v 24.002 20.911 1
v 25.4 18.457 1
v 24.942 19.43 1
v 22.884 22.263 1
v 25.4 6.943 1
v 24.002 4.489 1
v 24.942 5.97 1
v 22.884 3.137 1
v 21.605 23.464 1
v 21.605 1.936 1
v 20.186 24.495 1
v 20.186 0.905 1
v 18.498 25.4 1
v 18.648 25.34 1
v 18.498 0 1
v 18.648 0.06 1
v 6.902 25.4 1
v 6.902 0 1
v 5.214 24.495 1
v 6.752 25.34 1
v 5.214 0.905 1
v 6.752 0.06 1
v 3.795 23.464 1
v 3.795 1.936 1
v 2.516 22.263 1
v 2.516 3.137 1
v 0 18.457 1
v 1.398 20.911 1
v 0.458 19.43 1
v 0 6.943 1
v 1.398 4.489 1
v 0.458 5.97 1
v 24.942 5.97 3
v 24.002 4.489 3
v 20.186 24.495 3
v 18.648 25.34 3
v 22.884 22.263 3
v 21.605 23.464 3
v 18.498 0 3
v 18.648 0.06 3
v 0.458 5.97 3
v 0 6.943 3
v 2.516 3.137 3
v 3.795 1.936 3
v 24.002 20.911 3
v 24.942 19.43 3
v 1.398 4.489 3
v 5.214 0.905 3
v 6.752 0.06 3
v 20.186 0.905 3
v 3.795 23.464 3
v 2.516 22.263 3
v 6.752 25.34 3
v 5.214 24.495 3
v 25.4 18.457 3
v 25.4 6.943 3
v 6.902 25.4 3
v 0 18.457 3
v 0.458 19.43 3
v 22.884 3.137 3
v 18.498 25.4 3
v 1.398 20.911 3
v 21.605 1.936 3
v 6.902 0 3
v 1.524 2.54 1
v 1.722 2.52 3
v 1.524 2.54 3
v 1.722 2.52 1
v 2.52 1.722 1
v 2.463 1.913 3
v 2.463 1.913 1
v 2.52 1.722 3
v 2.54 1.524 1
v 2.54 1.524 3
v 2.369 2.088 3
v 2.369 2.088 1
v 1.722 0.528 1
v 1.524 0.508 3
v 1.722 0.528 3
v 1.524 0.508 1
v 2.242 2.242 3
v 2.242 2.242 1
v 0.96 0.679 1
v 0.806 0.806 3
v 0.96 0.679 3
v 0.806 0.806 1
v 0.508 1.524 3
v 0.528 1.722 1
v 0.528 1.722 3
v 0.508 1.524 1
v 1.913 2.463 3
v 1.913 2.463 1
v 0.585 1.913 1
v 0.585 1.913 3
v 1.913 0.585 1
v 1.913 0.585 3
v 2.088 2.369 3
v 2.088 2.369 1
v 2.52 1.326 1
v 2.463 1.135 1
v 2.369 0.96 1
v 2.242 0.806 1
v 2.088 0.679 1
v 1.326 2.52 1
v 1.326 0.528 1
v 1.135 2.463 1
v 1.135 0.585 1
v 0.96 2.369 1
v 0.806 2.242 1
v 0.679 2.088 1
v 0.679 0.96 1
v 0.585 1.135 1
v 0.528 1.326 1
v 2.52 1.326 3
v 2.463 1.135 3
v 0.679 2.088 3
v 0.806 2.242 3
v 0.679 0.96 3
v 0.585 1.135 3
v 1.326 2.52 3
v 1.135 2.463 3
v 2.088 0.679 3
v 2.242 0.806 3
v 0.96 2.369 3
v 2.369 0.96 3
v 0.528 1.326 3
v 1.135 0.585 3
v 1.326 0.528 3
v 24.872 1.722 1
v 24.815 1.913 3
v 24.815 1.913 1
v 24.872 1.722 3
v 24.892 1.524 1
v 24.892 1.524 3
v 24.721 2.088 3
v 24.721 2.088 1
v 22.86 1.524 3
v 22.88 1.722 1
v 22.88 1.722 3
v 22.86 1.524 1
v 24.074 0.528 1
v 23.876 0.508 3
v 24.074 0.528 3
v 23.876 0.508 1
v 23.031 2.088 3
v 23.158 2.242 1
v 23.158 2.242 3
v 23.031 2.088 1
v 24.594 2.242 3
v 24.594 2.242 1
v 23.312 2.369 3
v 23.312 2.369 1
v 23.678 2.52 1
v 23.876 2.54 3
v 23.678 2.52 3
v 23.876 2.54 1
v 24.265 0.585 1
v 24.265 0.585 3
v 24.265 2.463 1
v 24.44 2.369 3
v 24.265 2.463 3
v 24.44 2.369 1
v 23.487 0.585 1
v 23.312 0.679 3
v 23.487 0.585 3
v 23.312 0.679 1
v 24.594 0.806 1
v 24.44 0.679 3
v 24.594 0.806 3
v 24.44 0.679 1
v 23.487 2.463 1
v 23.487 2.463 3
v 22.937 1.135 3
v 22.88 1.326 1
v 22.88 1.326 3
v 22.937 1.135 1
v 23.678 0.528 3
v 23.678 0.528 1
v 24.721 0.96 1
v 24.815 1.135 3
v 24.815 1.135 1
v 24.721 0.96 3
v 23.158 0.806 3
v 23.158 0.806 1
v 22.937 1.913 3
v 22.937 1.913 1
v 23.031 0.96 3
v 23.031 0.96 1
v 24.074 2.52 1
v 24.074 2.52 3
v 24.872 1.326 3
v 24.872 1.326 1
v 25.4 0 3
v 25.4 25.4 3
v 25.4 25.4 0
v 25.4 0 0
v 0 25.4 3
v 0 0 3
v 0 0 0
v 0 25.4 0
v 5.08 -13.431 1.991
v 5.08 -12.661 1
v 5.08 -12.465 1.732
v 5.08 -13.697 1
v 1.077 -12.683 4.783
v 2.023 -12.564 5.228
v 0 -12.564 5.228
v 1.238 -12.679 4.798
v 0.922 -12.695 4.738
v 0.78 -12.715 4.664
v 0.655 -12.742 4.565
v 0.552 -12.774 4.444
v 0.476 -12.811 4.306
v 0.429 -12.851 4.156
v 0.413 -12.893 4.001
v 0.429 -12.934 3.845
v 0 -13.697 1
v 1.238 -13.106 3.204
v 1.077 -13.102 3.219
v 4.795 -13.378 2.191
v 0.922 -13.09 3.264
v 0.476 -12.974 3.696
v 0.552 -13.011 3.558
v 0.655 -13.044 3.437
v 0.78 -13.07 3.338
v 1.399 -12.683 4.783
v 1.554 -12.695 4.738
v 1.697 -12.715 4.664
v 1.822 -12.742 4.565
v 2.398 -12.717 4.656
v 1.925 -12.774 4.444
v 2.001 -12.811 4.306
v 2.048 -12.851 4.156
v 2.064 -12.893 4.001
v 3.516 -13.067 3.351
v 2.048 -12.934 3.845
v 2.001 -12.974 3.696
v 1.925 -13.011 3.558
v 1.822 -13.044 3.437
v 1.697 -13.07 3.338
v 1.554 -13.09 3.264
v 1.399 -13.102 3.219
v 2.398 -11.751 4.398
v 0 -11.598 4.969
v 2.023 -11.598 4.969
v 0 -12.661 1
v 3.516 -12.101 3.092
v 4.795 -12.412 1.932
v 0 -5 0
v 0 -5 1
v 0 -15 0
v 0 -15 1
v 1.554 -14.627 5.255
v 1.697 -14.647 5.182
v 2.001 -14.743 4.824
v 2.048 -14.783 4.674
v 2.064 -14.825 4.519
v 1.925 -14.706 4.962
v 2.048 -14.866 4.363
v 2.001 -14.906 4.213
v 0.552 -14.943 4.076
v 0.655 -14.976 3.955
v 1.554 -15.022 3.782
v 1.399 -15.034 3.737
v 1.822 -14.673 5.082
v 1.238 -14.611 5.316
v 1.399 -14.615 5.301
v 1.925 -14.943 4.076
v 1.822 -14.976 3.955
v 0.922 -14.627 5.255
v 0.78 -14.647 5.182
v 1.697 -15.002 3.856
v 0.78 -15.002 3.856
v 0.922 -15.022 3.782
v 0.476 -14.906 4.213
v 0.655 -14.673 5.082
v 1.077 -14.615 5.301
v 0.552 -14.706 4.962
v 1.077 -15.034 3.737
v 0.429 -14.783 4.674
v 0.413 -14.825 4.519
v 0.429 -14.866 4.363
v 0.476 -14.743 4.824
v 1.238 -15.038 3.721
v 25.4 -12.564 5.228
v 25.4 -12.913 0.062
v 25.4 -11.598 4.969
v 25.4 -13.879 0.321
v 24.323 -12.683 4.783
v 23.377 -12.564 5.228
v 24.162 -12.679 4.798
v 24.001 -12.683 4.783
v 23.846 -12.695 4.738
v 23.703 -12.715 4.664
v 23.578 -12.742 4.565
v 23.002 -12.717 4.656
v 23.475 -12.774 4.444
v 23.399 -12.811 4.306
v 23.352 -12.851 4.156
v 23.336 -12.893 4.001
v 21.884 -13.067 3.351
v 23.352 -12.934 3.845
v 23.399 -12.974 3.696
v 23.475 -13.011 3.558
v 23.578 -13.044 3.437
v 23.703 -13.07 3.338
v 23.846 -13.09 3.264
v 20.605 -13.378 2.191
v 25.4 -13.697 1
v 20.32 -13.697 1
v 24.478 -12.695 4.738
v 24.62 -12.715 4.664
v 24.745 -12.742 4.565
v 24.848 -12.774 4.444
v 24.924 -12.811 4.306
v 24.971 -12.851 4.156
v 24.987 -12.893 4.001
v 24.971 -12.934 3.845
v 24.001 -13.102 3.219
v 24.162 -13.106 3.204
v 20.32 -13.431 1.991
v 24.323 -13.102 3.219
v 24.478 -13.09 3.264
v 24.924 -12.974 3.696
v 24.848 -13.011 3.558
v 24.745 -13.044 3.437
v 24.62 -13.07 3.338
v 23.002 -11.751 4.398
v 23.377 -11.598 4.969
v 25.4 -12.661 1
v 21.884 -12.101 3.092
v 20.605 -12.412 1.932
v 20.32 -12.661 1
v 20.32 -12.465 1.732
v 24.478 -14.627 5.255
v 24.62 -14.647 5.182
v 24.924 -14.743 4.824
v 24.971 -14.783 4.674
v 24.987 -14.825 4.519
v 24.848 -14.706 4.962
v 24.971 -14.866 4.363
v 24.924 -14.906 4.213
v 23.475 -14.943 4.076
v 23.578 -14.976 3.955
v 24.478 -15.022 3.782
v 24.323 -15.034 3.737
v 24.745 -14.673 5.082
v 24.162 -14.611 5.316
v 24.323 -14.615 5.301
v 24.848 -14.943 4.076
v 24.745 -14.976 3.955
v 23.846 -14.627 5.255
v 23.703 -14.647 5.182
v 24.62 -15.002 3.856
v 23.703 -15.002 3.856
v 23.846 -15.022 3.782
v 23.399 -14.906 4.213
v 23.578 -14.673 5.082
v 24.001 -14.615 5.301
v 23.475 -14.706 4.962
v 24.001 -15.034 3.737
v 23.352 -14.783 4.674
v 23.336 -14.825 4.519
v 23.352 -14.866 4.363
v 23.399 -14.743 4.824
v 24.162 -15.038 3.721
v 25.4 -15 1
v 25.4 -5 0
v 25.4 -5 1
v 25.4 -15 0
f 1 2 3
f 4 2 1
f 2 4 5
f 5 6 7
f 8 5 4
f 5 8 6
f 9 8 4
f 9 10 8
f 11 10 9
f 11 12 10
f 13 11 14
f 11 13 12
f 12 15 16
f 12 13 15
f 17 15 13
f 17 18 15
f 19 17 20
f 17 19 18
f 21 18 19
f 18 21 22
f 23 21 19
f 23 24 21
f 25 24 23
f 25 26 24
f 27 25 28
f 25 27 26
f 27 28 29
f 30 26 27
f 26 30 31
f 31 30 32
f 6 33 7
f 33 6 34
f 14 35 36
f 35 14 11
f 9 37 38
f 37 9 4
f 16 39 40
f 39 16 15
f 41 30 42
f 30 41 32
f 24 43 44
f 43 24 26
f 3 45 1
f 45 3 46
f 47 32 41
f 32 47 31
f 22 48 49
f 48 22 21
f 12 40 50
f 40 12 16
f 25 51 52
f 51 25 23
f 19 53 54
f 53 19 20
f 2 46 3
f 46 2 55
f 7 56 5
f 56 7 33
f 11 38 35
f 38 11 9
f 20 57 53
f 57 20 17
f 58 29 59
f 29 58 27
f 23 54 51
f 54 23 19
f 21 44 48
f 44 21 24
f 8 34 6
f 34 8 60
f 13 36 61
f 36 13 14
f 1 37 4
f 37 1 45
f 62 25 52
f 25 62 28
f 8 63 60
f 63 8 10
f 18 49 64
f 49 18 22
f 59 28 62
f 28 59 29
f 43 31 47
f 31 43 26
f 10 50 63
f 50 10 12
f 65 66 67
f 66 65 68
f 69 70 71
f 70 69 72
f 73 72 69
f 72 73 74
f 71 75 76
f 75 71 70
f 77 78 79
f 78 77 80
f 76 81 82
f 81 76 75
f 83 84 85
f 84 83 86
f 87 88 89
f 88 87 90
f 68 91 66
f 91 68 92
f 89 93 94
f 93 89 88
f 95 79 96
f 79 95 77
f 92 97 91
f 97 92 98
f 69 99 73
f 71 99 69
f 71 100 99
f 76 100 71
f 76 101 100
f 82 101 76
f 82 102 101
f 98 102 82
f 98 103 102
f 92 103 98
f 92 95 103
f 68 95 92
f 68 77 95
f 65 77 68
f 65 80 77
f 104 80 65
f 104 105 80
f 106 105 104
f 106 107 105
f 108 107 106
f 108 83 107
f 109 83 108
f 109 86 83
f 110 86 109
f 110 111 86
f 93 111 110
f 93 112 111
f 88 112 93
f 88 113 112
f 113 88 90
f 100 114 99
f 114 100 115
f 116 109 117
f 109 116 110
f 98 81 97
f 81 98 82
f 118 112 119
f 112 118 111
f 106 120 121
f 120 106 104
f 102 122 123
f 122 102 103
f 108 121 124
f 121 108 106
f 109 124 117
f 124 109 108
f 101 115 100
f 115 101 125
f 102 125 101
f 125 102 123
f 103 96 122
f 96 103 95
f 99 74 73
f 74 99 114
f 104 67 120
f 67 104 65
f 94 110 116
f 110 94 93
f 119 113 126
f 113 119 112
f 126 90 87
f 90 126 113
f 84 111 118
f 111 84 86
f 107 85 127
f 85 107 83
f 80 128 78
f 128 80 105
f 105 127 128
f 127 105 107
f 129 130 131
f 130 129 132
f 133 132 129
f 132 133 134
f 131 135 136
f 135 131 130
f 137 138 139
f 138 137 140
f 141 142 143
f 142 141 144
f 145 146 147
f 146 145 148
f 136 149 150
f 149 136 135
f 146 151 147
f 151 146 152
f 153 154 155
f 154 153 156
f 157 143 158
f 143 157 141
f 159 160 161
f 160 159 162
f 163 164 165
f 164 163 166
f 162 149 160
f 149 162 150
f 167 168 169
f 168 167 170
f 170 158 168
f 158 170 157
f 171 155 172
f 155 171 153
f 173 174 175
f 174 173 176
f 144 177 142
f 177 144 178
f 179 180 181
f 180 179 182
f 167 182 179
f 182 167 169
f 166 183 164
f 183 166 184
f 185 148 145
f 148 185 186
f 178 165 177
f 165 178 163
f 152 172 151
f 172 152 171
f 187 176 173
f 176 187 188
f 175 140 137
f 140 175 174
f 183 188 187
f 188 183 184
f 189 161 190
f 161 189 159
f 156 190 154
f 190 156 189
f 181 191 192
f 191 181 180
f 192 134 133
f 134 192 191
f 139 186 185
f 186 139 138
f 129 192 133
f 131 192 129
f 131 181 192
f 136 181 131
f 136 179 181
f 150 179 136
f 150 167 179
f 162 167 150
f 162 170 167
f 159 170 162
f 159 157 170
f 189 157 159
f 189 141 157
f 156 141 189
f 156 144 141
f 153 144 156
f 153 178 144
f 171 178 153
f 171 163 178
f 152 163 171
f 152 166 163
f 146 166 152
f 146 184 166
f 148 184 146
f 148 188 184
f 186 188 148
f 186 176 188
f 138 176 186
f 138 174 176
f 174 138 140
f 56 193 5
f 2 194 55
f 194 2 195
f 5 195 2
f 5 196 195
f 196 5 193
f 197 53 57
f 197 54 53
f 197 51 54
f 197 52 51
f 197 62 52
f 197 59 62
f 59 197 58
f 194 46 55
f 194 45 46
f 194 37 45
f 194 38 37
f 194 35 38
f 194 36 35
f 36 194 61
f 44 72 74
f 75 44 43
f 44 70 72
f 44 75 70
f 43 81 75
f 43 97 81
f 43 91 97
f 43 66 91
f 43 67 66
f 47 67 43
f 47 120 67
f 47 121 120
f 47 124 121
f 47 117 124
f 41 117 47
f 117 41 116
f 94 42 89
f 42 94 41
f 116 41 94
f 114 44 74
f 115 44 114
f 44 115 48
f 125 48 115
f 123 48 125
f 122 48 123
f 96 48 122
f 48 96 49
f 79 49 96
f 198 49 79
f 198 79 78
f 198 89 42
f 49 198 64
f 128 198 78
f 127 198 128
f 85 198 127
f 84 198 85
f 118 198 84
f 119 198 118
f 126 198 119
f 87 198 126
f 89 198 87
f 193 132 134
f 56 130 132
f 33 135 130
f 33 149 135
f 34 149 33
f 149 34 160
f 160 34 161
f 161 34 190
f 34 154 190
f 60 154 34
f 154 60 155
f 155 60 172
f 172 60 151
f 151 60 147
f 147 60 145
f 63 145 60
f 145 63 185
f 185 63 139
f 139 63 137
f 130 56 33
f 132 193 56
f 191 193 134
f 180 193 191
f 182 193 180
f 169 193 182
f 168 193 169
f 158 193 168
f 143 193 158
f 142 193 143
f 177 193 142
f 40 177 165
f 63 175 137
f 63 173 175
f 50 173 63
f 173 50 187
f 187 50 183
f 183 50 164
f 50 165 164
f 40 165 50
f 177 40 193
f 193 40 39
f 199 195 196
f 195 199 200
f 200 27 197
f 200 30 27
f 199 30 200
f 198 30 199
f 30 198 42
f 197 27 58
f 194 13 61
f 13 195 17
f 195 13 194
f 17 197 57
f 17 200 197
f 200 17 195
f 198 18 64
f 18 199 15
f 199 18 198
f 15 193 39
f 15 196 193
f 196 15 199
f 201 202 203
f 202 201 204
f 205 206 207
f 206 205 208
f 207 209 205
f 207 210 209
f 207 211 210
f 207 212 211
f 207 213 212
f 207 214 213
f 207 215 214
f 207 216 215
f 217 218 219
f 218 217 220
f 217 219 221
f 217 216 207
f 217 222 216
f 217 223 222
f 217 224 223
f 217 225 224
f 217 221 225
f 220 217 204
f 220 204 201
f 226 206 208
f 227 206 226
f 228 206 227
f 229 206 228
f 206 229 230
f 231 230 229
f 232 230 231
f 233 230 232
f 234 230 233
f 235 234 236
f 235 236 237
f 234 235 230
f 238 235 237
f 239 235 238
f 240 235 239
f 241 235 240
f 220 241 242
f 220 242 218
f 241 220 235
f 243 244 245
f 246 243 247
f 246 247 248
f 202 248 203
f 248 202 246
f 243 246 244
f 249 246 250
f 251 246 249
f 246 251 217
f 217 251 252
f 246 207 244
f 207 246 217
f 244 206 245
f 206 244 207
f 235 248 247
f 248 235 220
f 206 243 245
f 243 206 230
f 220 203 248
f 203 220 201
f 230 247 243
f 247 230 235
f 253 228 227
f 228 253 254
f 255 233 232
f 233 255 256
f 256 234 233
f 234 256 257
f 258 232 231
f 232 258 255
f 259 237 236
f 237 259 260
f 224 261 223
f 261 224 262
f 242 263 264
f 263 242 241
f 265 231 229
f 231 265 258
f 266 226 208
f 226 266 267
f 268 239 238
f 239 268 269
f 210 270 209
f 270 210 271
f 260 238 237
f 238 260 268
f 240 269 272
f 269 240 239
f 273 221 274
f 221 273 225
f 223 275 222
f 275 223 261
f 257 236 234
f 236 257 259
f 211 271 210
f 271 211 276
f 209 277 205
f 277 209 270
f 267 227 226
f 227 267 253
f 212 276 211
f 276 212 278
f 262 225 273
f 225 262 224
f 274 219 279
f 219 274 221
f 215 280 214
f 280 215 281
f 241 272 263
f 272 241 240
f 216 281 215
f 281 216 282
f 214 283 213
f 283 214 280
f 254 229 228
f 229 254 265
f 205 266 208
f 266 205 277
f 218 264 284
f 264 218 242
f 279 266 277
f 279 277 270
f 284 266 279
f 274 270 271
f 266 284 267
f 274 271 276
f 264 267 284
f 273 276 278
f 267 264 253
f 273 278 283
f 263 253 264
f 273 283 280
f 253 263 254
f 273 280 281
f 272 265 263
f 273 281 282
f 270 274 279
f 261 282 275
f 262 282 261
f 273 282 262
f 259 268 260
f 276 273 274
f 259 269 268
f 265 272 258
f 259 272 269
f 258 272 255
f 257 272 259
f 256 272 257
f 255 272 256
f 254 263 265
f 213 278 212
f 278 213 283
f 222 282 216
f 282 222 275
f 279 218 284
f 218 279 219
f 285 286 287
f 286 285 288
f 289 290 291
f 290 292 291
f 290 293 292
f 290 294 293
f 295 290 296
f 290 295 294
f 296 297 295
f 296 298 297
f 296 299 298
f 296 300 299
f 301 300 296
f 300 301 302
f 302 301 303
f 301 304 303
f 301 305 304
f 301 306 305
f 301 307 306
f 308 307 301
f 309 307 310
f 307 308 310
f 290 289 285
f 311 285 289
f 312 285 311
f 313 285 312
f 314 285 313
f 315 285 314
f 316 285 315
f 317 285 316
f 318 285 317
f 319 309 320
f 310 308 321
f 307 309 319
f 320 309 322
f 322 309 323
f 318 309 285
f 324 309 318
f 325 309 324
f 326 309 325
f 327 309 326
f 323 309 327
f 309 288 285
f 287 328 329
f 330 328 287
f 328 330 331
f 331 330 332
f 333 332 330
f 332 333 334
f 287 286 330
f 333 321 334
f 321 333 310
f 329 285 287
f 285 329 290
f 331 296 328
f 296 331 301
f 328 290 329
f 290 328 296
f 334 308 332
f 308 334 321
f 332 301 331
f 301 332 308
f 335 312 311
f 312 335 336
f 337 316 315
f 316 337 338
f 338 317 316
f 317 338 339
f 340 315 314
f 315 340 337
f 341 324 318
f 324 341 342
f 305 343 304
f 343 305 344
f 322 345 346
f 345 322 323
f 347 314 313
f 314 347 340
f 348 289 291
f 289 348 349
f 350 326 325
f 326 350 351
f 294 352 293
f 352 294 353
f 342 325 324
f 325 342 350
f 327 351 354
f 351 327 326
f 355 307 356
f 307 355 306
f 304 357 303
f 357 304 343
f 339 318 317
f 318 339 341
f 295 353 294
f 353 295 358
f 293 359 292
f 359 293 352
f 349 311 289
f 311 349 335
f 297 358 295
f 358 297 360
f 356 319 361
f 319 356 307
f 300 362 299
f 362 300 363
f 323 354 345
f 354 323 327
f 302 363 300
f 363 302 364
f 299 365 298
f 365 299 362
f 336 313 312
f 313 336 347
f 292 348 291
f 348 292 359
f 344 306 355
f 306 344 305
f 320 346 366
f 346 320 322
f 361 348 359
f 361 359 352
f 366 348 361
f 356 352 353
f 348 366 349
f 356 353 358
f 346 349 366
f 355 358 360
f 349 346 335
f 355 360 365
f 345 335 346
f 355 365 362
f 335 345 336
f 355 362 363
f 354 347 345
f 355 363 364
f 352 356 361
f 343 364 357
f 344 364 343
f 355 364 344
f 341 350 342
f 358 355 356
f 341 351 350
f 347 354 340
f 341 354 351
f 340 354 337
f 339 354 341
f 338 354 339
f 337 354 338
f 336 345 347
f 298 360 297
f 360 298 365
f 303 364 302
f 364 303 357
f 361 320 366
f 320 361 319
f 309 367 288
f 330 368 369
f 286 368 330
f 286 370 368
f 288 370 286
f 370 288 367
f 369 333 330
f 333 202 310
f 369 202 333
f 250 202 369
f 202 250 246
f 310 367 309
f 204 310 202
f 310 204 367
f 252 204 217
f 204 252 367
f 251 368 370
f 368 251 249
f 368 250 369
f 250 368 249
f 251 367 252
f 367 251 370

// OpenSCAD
// D&D Base w/Sign
// Created by Doug Kress
// First published on 2017-01-01.

// Use Wet erase markers to identify monsters in your battles.
/* [Options] */

// What would you like to create?
PrintOption = "both"; // [both:Both, base:Base Only, sign:SignOnly]

// select a size
BaseSize = 1;   // [0.75:Small, 1:Medium, 2:Large, 3:Huge, 4:Gargantuan, 6:Colossal]

// hight of sign (millimeters)
SignHeight = 10;

/* [Custom] */

// base size (in inches) - "Base Size" above will be ignored
Custom = 0;

printBase(PrintOption, Custom > 0 ? Custom : BaseSize);

module printBase(option, size) {
    if (option != "sign") {
        base(size * 25.4);
    }
    if (option != "base") {
        translate([0,-(SignHeight+5),0]) baseSign(size * 25.4);
    }
}

module base(baseSize)
{
    difference() {
        cube([baseSize, baseSize, 3]);
        union() {
        translate([baseSize/2, baseSize/2, 1])
            cylinder(r=baseSize/2*1.1 , h=3, $fn=50);
            
        offset = baseSize * 0.04;
        translate([offset*1.5, offset*1.5, 1])
            cylinder(r=offset, h=3, $fn=32);
        translate([baseSize-offset*1.5, offset*1.5, 1])
            cylinder(r=offset, h=3, $fn=32);
        }
    }
}


module signTab(baseSize, reverse)
{
    offset = baseSize * 0.0325;
    position = reverse ? baseSize * .2 - offset * 1.5 : offset * 1.5;
    cylPosition = reverse ? baseSize*.2 - baseSize/2-1 : baseSize/2+1;
    difference() {
        cube([baseSize*.2, baseSize*.2, 1]);
        translate([cylPosition,baseSize/2, -1])
            cylinder(r=baseSize/2*1.1 , h=3, $fn=50);
        
    }
    translate([position, baseSize*.15, 0])
        cylinder(r=offset, h=3, $fn=32);

}
module baseSign(baseSize)
{
    offset = baseSize * 0.035;
    cube([baseSize, SignHeight, 1]);
    rotate([75, 0, 0])  {
        translate([0,0.6,-2])
            signTab(baseSize, false);
        translate([baseSize-baseSize*.2,0.6,-2])
            signTab(baseSize, true);
   }         
}
